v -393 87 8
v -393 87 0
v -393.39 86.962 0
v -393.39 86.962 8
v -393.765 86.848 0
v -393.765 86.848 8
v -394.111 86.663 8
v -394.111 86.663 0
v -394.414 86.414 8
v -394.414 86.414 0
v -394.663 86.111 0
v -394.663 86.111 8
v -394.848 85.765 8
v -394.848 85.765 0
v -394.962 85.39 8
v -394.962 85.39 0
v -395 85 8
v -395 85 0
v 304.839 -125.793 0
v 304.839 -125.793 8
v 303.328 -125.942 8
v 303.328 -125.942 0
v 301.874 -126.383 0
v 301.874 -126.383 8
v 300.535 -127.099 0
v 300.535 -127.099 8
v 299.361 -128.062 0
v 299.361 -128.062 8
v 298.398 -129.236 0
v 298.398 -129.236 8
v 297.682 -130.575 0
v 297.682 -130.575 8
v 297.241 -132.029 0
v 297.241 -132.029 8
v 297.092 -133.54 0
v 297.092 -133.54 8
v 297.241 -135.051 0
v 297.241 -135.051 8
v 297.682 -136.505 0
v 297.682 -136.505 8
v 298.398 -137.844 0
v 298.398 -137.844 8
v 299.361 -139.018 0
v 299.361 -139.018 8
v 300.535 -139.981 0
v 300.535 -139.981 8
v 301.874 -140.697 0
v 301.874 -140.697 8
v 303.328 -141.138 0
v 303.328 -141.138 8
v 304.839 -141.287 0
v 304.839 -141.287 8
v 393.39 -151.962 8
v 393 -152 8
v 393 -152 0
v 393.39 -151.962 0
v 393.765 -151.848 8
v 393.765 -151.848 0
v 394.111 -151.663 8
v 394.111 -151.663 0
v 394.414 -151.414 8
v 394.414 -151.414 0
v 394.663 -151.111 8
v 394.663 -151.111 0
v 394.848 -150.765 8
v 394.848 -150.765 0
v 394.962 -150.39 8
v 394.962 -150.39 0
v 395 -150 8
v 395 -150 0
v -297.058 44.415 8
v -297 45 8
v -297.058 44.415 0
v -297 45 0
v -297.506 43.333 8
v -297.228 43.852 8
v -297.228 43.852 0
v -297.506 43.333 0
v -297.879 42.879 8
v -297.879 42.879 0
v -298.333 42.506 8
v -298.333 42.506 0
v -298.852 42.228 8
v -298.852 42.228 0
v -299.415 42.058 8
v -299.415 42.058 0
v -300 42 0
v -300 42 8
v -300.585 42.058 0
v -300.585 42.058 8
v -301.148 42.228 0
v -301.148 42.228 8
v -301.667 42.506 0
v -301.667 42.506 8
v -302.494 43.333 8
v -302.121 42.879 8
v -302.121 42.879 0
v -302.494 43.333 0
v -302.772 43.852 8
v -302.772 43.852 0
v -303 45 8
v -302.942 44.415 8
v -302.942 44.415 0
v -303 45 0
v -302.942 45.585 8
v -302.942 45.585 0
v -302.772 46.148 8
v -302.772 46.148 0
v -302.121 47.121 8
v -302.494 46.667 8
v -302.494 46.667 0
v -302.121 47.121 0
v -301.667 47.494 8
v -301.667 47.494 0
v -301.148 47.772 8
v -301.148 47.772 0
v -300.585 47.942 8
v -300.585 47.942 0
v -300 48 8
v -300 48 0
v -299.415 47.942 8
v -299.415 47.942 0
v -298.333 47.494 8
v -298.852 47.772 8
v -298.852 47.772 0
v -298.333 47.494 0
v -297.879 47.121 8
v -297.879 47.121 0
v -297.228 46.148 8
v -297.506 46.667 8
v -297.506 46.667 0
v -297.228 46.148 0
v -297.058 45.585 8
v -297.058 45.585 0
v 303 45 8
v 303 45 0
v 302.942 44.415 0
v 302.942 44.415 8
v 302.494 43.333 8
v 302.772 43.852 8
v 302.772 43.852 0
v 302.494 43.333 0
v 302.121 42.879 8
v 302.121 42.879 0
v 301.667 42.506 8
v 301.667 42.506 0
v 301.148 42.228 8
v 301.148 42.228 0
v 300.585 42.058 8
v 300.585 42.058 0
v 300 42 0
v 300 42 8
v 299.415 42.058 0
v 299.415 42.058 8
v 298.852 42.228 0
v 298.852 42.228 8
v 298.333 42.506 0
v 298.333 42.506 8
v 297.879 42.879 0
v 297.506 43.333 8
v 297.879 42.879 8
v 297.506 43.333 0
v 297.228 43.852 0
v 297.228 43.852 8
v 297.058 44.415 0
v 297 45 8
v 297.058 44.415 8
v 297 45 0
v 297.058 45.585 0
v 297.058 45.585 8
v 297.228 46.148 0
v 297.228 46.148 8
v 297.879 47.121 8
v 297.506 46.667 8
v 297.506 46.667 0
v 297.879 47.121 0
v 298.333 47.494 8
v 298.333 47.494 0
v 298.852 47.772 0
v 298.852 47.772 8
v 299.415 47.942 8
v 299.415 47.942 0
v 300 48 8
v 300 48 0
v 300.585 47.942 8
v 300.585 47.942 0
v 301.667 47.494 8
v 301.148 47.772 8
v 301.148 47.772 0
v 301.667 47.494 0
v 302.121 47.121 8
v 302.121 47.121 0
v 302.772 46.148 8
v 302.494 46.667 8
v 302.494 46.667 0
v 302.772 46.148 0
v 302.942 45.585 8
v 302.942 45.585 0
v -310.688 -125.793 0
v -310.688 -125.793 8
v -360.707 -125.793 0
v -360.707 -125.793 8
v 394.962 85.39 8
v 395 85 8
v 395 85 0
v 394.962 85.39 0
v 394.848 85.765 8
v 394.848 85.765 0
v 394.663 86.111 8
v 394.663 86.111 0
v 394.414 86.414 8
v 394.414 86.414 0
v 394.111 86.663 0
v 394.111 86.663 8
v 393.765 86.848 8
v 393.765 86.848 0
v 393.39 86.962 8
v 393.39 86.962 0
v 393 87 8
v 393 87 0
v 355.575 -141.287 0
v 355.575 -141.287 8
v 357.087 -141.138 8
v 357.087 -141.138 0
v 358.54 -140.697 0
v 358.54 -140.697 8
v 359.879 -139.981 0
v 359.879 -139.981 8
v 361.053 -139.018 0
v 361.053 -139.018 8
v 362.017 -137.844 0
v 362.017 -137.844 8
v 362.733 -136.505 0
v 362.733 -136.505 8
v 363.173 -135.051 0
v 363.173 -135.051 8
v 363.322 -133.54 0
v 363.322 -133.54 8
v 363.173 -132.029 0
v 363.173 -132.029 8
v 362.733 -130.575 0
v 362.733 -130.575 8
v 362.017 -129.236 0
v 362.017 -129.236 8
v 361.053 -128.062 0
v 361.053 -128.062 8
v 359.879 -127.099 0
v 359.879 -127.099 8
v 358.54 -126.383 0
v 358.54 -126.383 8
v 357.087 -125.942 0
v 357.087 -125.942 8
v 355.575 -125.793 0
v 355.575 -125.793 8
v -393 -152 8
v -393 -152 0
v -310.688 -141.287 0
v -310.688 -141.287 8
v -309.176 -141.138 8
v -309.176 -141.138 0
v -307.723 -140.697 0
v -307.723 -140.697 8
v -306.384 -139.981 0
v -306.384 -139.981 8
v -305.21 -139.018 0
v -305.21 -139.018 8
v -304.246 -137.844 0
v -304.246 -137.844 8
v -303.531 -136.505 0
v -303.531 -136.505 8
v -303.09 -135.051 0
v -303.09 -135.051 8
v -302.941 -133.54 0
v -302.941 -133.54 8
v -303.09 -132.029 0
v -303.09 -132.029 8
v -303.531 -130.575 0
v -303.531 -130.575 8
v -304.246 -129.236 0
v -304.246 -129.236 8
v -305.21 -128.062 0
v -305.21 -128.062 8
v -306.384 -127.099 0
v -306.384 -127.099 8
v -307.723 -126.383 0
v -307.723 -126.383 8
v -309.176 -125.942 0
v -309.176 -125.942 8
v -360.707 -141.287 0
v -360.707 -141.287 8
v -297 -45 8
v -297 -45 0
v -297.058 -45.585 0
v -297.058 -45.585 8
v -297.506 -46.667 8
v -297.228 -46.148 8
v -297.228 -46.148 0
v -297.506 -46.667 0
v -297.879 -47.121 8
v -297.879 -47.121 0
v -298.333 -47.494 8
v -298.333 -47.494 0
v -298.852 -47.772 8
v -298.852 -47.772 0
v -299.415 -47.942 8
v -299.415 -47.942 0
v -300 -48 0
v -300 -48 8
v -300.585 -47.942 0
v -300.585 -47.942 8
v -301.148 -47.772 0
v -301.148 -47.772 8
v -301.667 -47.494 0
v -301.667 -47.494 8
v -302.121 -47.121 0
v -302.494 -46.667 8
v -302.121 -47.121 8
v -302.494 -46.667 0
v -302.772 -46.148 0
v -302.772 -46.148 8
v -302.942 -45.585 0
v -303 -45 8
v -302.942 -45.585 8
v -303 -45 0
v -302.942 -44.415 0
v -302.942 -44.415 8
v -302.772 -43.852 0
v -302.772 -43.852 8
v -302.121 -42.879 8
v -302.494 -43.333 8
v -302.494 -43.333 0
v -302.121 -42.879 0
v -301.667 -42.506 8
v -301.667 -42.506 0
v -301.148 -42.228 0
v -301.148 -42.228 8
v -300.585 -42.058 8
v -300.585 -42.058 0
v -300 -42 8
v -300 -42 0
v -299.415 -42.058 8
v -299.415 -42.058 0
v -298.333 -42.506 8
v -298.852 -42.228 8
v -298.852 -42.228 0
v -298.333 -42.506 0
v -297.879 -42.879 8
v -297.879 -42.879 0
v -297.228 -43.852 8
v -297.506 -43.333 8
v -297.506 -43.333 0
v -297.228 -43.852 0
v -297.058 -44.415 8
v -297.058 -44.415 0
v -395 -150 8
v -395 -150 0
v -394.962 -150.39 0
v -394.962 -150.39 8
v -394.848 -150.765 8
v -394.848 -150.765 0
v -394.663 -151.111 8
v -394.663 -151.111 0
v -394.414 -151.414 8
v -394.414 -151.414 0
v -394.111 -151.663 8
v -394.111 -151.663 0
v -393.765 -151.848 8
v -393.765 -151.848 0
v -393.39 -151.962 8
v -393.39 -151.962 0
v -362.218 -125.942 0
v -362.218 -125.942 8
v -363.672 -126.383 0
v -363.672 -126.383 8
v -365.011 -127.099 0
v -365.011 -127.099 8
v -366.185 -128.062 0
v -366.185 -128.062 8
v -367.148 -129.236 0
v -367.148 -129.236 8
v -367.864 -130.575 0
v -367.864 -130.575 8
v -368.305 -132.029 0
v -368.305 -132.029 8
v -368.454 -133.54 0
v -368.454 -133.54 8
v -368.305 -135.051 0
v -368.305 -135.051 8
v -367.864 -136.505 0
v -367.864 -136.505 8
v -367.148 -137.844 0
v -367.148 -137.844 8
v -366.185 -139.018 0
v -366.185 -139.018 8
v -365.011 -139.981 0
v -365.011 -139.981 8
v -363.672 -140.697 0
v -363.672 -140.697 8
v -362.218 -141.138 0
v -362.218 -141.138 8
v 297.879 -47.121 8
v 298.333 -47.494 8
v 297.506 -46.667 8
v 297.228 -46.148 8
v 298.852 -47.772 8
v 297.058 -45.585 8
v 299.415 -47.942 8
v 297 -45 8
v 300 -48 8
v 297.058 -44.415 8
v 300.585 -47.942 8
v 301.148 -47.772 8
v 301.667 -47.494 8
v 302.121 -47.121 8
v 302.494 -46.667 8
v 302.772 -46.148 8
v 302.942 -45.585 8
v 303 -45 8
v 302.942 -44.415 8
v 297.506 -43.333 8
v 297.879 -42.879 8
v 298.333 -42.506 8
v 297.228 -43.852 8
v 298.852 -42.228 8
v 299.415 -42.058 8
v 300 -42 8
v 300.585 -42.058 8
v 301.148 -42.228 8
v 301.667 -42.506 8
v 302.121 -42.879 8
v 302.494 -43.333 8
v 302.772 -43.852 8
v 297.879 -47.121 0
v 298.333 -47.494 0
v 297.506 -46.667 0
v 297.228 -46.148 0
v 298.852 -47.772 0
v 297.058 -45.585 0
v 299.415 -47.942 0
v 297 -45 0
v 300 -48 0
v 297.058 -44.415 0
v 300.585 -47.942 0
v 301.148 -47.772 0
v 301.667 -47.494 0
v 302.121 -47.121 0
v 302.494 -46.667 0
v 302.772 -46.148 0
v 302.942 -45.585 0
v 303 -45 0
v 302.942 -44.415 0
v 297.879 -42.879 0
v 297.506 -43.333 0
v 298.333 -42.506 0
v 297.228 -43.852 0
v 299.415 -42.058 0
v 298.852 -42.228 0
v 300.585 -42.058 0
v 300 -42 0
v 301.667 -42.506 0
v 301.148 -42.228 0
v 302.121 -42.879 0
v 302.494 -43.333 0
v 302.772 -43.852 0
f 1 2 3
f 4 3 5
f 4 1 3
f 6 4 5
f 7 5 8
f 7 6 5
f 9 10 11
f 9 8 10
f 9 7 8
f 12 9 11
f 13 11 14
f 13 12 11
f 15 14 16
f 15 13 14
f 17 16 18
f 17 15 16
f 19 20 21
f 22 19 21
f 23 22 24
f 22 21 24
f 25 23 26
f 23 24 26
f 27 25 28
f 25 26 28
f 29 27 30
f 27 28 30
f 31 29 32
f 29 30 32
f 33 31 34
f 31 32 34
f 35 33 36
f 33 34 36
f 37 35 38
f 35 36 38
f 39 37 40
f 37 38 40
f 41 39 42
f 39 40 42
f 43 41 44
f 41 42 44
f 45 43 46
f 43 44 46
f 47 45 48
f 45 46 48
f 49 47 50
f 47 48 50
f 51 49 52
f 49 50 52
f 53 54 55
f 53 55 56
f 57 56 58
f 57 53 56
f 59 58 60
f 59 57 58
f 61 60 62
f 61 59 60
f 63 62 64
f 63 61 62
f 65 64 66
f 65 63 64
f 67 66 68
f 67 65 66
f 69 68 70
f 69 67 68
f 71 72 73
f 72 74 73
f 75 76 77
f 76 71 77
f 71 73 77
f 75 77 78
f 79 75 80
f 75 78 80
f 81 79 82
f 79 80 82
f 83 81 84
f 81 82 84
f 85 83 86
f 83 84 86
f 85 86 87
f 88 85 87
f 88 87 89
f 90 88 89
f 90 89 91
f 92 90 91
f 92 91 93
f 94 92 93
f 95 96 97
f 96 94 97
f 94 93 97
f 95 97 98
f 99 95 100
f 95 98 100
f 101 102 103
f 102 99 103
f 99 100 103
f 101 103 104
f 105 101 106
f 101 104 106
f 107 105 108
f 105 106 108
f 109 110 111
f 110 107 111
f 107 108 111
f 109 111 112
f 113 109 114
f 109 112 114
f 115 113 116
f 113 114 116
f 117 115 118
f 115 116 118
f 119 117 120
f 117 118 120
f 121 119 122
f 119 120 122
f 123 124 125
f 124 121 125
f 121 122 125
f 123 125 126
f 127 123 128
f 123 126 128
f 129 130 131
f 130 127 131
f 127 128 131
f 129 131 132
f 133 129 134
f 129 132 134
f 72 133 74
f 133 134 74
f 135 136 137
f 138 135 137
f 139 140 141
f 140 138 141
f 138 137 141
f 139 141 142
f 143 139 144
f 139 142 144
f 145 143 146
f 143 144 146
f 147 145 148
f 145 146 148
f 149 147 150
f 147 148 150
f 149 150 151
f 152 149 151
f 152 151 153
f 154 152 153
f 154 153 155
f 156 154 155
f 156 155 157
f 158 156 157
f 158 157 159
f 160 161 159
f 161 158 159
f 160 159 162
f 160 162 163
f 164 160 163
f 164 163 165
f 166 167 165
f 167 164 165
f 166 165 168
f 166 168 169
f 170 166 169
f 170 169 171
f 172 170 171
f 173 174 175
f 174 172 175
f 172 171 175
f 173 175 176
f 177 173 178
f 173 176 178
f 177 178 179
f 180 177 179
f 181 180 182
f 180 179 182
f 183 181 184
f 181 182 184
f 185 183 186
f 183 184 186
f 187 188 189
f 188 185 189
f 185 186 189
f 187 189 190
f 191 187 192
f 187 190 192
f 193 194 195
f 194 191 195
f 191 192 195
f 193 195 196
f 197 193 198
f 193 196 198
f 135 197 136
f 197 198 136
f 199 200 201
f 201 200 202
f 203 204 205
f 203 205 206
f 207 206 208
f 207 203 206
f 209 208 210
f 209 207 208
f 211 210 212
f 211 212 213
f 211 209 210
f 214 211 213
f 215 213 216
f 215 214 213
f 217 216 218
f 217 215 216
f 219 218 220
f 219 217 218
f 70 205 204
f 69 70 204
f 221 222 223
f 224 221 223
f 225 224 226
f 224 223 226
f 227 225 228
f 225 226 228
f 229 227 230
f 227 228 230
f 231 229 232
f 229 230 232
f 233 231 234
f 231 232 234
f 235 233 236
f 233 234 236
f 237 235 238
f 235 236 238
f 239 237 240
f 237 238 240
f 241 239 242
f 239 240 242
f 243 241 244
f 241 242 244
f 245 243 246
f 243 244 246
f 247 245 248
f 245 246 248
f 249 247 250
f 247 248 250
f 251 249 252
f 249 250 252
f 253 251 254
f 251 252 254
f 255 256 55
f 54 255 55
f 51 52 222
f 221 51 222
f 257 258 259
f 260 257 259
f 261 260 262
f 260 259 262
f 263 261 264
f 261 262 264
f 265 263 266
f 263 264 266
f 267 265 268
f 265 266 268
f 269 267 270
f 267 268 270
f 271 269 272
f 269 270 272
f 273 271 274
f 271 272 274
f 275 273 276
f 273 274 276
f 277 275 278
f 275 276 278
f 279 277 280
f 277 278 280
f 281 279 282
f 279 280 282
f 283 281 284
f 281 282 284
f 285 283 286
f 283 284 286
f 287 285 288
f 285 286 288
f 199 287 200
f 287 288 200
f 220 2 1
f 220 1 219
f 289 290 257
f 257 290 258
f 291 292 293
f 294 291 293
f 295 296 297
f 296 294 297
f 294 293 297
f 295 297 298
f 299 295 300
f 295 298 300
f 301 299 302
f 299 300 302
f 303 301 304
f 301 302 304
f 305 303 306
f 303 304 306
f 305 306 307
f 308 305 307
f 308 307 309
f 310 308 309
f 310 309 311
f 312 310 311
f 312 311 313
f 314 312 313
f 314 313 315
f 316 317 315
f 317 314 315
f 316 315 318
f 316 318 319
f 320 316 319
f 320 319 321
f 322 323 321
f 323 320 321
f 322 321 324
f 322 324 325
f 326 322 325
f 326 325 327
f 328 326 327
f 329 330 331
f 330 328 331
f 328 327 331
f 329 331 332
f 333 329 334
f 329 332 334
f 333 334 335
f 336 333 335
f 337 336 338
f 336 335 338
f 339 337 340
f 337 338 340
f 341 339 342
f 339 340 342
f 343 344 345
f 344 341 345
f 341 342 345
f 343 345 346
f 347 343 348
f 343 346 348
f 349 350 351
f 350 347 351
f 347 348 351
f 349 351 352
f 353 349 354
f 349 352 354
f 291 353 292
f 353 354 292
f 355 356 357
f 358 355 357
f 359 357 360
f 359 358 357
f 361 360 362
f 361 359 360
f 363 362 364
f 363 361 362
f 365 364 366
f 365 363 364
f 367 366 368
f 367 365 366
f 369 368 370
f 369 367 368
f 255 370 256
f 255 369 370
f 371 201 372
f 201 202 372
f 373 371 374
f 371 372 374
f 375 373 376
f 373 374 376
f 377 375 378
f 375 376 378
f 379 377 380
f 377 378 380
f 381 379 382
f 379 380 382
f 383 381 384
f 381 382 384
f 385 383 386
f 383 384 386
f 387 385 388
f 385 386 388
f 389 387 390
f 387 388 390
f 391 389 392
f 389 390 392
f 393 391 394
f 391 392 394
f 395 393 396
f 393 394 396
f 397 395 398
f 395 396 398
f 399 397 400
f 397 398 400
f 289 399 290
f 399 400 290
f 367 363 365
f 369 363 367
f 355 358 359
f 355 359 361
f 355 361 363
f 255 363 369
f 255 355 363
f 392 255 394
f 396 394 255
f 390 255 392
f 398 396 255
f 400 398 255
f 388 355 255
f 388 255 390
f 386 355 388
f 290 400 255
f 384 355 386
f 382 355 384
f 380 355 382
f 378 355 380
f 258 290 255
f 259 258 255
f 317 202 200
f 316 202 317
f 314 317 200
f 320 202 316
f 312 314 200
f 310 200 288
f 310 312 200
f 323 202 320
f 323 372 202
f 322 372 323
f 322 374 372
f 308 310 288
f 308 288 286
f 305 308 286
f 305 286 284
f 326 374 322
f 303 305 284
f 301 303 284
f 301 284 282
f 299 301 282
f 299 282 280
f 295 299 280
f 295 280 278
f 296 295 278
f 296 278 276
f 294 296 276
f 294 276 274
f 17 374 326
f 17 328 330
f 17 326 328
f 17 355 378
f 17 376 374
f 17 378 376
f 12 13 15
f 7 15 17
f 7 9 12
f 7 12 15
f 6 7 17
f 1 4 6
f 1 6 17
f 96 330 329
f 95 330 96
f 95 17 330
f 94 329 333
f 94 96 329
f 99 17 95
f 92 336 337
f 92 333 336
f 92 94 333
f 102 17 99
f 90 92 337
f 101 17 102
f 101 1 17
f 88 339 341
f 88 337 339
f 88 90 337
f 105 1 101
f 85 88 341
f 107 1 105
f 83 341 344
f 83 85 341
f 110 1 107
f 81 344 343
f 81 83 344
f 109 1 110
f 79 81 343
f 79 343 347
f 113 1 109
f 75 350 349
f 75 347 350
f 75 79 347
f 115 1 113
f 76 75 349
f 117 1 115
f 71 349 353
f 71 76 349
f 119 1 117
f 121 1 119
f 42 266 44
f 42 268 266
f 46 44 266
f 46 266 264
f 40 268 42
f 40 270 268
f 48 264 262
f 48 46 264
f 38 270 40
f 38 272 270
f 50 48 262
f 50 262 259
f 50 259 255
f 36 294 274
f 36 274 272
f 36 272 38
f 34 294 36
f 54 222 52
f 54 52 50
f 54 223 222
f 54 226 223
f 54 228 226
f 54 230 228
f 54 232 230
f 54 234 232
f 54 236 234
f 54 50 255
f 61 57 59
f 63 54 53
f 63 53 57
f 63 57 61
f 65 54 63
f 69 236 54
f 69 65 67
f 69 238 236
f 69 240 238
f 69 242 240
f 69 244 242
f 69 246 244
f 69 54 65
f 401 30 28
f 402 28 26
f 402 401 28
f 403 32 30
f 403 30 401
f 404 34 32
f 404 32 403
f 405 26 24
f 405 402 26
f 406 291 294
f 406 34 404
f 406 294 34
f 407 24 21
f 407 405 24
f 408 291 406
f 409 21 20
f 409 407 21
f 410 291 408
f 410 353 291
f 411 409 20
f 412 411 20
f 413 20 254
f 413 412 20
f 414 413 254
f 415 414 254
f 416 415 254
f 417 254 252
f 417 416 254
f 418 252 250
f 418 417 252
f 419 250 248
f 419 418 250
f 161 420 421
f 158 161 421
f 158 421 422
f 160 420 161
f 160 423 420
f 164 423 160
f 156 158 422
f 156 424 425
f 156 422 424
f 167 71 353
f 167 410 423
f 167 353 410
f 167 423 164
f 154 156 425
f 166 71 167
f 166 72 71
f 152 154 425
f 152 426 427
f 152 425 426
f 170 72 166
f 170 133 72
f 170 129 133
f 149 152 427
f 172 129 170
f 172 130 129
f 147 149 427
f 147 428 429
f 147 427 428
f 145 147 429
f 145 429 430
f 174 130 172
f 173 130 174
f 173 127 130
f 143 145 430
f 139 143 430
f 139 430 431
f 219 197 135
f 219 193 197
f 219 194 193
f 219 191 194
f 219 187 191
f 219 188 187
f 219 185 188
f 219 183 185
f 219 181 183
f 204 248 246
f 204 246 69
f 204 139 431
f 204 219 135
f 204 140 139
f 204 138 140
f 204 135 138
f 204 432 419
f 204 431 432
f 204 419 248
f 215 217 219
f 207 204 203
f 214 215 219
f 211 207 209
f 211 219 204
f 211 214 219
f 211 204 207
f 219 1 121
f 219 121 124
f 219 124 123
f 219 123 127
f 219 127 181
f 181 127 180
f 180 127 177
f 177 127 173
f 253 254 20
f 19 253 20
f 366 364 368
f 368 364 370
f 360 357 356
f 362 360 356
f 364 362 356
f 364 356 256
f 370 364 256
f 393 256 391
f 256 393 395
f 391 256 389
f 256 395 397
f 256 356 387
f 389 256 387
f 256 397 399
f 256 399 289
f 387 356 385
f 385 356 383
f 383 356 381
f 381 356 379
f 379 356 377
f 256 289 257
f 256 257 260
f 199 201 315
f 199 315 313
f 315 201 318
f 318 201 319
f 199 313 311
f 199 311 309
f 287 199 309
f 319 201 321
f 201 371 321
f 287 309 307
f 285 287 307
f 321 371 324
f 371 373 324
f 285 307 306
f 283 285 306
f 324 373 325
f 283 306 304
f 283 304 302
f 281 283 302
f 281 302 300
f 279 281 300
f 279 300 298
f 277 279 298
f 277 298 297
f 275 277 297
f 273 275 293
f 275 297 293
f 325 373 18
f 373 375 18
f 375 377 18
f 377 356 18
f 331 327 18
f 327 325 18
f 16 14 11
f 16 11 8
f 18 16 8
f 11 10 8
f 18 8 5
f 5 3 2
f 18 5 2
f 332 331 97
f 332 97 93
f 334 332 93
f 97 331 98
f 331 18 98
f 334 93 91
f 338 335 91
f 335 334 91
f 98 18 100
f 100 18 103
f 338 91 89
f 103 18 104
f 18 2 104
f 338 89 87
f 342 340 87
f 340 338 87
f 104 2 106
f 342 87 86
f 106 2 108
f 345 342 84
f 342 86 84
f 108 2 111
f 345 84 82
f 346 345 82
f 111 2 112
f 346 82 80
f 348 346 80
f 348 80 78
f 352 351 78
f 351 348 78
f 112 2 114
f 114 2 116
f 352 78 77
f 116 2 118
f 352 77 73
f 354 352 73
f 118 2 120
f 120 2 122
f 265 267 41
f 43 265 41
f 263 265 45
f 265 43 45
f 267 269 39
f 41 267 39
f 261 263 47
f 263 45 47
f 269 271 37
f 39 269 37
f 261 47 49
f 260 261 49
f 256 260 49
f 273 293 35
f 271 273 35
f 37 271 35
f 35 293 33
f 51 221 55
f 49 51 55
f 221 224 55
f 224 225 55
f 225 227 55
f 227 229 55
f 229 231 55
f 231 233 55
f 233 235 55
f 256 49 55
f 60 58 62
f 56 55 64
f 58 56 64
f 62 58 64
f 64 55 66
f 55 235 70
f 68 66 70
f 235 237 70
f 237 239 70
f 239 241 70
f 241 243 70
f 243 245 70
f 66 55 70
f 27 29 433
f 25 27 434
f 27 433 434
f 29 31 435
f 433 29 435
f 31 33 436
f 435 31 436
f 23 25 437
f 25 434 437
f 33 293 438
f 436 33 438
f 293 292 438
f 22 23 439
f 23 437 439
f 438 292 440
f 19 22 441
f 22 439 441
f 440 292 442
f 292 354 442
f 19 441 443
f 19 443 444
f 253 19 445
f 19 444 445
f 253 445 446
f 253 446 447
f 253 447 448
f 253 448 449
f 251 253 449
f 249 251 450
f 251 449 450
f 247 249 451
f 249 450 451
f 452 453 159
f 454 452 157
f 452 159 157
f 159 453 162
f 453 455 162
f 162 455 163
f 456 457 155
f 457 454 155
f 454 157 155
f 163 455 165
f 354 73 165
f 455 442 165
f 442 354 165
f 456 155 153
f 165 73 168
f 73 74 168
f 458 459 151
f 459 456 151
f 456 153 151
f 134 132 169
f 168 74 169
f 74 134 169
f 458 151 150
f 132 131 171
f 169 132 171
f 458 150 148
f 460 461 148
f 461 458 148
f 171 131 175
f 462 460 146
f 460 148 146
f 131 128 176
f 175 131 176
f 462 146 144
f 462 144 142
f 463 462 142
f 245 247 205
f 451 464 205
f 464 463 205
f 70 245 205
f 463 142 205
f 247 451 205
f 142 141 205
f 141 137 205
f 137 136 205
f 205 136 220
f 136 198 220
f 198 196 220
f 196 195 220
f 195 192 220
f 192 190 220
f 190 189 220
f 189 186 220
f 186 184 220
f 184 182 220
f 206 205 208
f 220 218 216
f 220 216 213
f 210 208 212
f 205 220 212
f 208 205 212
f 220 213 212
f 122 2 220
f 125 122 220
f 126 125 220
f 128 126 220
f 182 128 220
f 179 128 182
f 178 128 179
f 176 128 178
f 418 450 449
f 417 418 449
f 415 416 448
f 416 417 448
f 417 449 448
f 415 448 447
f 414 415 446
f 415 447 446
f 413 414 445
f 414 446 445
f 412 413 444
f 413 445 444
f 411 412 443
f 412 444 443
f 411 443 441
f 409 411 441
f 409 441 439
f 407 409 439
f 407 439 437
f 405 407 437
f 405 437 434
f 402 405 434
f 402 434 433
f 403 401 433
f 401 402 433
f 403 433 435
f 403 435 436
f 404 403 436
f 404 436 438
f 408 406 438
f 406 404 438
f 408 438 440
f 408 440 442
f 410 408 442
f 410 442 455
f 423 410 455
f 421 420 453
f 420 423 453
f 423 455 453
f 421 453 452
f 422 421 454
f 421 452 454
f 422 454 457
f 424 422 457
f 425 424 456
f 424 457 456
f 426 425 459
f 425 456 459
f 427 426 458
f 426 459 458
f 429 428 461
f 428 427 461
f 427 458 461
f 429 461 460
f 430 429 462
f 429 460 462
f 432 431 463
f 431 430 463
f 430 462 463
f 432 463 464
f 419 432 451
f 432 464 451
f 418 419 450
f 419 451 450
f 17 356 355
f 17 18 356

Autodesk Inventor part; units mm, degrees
ref_plane "YZ Plane" through (0, 0, 0) normal (1, 0, 0) x (0, 1, 0)
ref_plane "XZ Plane" through (0, 0, 0) normal (0, 1, 0) x (-1, 0, 0)
ref_plane "XY Plane" through (0, 0, 0) normal (0, 0, 1) x (1, 0, 0)
sketch "Sketch1" plane through (0, 0, 0) normal (0, 0, 1) x (1, 0, 0)
  circle A0 centre (300, 45) radius 3 projected
  circle A1 centre (-300, -45) radius 3 projected
  circle A2 centre (300, -45) radius 3 projected
  circle A3 centre (-300, 45) radius 3 projected
  line L0 (395, -87) -> (-395, -87) projected
  line L1 (395, -87) -> (395, 87) projected
  line L2 (-395, 87) -> (395, 87) projected
  line L3 (-395, 87) -> (-395, -87) projected
  line L4 (395, 87) -> (-395, 87)
  line L5 (-395, 87) -> (-395, -148)
  line L6 (-395, -148) -> (395, -148)
  line L7 (395, -148) -> (395, 87)
  point P0 (0, 0)
  dimension "d0" = 235
extrude "Extrusion1" add sketch "Sketch1" along normal blind 8
sketch "Sketch2" plane through (0, 0, 8) normal (0, 0, 1) x (1, 0, 0)
  line L0 (387.8577, -133.54) -> (-386.877, -133.54) construction
  line L1 (390.6938, 247.5) -> (-382.1387, 247.5) construction
  arc A0 (355.5754, 239.7531) -> (355.5754, 255.2469) centre (355.5754, 247.5) ccw projected
  arc A1 (304.8389, 255.2469) -> (304.8389, 239.7531) centre (304.8389, 247.5) ccw projected
  line L2 (355.5754, 239.7531) -> (304.8389, 239.7531) projected
  line L3 (304.8389, 255.2469) -> (355.5754, 255.2469) projected
  line L4 (-310.6878, 239.7531) -> (-360.707, 239.7531) projected
  line L5 (-360.707, 255.2469) -> (-310.6878, 255.2469) projected
  arc A2 (-310.6878, 239.7531) -> (-310.6878, 255.2469) centre (-310.6878, 247.5) ccw projected
  arc A3 (-360.707, 255.2469) -> (-360.707, 239.7531) centre (-360.707, 247.5) ccw projected
  line L6 (304.8389, -133.54) -> (355.5754, -133.54) construction
  line L7 (304.8389, -141.2869) -> (355.5754, -141.2869)
  line L8 (355.5754, -125.7931) -> (304.8389, -125.7931)
  arc A4 (304.8389, -125.7931) -> (304.8389, -141.2869) centre (304.8389, -133.54) ccw
  arc A5 (355.5754, -141.2869) -> (355.5754, -125.7931) centre (355.5754, -133.54) ccw
  line L9 (-360.707, -133.54) -> (-310.6878, -133.54) construction
  line L10 (-360.707, -141.2869) -> (-310.6878, -141.2869)
  line L11 (-310.6878, -125.7931) -> (-360.707, -125.7931)
  arc A6 (-360.707, -125.7931) -> (-360.707, -141.2869) centre (-360.707, -133.54) ccw
  arc A7 (-310.6878, -141.2869) -> (-310.6878, -125.7931) centre (-310.6878, -133.54) ccw
  point P0 (0, 0)
  point P1 (330.2072, -133.54)
  point P2 (-335.6974, -133.54)
  dimension "d3" = 381.04
extrude "Extrusion2" cut sketch "Sketch2" against normal through all contours A4 L8 A5 L7 | A6 L11 A7 L10
thicken "Thicken1" operation add thickness 4 both sides no extend neighbours no toward (0, -1, 0) faces at (-131.6667, -148, 2.6667)
fillet "Fillet1" radius 2 4 edges at (395, -152, 4) (395, 87, 4) (-395, -152, 4) (-395, 87, 4)
properties part number "Plexi_Bildverarbeitungsband"
